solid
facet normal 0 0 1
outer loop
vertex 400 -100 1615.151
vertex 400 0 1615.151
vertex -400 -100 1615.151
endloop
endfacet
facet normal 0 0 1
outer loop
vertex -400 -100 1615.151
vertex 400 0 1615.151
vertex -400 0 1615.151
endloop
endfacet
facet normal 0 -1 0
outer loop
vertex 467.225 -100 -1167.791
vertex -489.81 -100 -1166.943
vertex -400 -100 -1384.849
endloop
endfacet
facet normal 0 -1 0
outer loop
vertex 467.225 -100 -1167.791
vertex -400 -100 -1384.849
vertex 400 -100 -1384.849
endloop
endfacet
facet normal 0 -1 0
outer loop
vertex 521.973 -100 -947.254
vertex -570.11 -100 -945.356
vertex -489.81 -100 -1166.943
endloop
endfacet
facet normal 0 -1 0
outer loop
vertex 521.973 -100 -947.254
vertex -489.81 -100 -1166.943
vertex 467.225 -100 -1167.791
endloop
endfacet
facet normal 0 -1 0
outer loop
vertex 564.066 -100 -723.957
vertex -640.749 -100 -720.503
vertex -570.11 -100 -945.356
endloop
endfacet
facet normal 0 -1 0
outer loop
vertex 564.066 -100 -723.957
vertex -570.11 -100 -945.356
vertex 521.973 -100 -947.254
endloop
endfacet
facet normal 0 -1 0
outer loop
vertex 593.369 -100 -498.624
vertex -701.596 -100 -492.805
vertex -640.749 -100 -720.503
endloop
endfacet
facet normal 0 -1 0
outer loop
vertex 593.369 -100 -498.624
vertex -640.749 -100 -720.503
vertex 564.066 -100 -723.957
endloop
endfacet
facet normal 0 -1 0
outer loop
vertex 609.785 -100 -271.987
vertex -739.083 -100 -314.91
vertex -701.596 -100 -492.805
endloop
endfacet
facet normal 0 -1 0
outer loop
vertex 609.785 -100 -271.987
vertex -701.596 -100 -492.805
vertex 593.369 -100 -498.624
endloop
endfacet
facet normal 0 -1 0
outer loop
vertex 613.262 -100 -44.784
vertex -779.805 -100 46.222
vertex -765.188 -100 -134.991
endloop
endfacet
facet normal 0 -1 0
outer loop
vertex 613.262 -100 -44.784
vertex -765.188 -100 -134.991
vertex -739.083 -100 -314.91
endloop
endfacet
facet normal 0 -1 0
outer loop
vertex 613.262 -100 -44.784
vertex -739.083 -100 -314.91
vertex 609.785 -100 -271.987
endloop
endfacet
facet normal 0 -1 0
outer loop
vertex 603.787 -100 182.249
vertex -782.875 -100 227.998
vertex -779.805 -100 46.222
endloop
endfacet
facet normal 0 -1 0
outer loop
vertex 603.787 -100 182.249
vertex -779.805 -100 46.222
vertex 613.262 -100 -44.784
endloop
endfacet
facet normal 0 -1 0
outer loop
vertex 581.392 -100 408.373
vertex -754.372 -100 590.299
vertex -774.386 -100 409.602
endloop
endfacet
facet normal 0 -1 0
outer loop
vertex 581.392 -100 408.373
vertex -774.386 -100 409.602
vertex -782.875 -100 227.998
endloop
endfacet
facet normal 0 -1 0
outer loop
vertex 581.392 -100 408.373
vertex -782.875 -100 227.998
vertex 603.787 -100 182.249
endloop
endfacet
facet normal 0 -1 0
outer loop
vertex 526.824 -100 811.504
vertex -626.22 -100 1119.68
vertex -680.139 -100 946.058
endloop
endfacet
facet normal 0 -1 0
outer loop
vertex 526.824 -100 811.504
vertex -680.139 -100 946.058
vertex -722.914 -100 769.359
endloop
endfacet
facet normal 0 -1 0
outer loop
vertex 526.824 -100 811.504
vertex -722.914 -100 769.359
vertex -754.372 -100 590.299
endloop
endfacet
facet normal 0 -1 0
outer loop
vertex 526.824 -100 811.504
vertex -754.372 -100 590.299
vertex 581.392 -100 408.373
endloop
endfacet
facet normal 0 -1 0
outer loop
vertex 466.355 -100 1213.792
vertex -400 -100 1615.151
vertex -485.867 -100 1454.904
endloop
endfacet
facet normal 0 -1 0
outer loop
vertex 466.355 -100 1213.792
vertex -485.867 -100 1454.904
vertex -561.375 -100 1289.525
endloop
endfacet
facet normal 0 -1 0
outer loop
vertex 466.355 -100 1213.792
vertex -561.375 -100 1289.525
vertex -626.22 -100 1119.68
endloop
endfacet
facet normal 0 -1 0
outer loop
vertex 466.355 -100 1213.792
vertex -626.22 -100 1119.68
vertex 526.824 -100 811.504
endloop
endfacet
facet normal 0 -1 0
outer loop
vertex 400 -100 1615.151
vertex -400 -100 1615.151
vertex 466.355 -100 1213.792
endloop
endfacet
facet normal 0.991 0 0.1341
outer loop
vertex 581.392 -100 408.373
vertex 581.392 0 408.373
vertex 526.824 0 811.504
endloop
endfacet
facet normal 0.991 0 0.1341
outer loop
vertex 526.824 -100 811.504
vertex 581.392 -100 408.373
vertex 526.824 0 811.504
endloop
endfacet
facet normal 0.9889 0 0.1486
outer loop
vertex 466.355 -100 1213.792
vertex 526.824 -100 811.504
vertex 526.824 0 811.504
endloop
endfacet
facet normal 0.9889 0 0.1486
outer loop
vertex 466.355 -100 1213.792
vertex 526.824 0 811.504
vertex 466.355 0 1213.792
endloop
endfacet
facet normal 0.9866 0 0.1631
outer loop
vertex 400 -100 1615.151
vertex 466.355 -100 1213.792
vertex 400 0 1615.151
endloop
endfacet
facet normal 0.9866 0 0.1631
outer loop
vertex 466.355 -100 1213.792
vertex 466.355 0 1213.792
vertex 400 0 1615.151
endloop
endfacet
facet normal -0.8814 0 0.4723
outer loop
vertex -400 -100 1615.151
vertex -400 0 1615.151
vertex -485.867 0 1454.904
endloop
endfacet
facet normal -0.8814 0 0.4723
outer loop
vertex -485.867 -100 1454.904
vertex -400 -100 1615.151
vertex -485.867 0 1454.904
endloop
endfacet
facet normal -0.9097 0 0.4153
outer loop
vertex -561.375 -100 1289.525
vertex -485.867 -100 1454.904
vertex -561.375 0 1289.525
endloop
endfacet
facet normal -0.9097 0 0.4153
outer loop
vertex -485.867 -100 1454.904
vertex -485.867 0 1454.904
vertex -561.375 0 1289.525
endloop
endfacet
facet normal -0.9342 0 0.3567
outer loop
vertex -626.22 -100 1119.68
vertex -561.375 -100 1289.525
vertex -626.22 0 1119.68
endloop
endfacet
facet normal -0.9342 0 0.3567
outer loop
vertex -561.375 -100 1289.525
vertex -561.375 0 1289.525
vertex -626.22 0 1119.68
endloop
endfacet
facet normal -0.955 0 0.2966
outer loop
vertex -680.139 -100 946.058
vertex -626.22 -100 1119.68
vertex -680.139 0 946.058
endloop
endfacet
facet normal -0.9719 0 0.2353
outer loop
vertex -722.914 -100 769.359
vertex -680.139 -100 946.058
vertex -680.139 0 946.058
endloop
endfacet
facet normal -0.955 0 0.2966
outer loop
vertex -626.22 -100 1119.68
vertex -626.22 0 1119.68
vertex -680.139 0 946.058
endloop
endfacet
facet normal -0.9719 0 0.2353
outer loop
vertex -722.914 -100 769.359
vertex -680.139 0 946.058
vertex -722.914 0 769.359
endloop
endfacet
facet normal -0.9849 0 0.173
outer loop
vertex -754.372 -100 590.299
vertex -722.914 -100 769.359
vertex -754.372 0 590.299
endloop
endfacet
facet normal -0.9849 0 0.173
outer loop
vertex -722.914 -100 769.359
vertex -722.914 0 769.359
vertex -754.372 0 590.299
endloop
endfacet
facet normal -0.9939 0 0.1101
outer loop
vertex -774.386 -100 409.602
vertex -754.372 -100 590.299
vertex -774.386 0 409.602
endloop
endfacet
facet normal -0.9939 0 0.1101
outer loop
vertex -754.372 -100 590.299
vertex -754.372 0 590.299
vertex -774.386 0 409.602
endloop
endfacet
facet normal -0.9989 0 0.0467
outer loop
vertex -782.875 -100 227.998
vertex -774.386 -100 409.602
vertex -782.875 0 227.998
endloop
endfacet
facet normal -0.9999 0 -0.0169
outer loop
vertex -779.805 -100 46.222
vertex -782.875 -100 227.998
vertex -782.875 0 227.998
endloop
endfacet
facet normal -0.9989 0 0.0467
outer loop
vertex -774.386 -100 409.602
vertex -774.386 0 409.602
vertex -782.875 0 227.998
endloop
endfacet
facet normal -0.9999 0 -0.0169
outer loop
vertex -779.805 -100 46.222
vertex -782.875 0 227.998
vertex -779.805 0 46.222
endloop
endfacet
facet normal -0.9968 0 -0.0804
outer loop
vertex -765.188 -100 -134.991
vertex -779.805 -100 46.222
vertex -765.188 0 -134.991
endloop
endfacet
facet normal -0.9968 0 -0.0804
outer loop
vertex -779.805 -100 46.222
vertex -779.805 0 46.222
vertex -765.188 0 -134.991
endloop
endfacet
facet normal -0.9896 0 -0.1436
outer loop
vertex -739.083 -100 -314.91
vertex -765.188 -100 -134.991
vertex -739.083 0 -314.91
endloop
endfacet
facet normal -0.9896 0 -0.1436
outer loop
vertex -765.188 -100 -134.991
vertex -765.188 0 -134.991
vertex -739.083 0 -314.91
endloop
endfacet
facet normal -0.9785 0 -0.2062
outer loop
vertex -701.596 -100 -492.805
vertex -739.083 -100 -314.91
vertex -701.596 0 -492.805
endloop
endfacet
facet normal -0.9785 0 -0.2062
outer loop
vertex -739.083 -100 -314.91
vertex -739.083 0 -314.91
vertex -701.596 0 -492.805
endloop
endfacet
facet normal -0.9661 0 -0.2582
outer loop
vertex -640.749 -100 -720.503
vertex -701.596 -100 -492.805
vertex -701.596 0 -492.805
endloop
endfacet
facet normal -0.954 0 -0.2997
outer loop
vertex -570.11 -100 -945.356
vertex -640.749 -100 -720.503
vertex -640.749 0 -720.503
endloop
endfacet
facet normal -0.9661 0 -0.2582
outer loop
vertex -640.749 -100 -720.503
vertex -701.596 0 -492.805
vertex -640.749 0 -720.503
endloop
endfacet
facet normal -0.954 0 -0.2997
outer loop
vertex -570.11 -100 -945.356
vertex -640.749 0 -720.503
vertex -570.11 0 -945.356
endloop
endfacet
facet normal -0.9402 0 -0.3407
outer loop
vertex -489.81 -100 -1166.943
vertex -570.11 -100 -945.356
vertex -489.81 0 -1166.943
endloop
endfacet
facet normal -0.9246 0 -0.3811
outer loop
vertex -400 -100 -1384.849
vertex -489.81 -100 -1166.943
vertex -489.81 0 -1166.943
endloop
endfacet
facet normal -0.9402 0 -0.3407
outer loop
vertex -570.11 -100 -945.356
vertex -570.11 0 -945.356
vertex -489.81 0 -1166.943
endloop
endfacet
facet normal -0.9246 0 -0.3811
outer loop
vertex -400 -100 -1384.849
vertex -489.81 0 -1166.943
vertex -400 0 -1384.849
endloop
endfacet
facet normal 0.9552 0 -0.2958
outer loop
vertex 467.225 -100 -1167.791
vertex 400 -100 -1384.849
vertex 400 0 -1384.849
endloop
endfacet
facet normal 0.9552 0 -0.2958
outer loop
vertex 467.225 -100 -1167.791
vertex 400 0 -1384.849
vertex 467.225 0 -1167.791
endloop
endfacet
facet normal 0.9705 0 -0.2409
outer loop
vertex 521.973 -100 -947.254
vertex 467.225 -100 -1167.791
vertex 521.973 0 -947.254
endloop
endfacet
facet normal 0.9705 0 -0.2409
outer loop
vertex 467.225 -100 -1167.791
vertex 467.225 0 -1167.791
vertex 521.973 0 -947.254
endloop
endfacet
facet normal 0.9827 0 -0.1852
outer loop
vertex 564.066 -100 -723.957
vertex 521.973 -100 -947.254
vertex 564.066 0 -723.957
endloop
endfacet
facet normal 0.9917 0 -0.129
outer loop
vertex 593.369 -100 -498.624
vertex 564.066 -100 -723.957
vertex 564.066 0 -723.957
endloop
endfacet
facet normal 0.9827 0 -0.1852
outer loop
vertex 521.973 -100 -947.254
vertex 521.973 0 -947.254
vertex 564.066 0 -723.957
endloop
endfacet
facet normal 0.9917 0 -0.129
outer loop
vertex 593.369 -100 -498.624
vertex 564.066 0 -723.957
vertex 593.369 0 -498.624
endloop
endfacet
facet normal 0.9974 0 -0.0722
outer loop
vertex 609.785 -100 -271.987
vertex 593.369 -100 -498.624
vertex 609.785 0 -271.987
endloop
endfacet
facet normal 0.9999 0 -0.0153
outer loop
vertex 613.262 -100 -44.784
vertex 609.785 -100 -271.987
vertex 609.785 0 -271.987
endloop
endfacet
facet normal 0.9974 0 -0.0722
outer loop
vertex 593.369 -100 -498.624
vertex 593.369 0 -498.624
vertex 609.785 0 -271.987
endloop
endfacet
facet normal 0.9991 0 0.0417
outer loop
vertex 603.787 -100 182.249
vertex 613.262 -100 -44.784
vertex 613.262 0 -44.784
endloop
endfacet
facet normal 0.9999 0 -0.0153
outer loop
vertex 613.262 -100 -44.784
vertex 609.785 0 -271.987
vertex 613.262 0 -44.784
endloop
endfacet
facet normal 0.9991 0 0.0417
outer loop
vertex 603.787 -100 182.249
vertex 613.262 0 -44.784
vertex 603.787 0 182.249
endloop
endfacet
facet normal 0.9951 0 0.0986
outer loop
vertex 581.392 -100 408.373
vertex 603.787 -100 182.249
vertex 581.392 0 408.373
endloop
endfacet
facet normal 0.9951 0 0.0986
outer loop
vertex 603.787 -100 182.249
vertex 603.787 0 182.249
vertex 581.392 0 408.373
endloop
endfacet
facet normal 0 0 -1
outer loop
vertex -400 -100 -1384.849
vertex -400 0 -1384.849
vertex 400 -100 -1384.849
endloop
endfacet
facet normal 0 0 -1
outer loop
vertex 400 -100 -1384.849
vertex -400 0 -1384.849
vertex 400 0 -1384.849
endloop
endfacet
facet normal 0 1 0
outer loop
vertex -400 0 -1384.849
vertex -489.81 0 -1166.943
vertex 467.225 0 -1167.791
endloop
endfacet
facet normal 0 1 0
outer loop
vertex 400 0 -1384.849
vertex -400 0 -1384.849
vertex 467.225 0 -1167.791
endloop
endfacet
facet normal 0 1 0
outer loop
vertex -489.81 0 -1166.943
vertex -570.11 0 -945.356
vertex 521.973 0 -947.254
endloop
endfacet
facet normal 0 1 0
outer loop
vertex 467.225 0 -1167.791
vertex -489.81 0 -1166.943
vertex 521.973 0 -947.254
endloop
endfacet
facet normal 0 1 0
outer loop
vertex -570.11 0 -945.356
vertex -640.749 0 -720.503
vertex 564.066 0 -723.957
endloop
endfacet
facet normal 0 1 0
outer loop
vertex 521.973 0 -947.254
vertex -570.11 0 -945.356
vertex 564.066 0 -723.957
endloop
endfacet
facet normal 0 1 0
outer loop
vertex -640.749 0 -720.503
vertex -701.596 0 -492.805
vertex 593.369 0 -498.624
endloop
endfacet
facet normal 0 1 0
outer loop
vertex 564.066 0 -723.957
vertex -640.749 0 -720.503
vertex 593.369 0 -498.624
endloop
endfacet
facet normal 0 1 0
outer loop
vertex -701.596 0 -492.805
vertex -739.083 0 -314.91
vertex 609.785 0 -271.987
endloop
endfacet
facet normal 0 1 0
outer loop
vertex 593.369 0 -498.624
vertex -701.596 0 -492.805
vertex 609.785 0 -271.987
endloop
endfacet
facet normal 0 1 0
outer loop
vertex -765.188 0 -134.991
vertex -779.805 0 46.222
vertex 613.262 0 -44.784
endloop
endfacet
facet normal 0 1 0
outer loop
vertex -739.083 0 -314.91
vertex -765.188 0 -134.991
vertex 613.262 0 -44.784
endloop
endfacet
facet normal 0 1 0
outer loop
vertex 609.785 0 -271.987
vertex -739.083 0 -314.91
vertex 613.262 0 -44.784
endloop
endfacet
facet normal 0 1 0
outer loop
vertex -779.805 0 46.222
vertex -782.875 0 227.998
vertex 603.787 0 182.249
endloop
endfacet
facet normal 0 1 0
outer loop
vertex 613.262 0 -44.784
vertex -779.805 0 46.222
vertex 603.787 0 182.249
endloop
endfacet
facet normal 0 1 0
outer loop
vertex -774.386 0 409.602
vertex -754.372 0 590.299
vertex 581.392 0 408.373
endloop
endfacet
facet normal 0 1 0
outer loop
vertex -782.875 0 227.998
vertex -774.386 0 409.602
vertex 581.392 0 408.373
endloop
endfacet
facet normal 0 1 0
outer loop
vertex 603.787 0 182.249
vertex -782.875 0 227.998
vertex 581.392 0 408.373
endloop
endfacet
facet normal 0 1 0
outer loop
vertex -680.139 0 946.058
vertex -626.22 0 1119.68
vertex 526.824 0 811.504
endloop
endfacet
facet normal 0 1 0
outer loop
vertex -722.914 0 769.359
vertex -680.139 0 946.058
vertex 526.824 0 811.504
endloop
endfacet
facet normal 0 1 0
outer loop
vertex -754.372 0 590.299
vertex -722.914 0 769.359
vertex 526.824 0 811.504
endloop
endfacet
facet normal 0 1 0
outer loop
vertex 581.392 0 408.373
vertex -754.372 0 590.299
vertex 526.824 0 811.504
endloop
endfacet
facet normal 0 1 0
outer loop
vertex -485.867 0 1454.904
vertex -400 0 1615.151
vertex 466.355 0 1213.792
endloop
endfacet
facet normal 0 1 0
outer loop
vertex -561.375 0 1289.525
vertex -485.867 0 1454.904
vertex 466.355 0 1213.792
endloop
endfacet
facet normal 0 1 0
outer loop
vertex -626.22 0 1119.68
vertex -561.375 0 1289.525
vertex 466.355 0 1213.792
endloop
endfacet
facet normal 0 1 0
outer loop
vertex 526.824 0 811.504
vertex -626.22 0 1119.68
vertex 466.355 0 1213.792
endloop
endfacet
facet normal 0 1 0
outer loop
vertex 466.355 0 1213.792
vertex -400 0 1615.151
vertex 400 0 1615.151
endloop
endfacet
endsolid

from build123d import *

# Parameters (mm, degrees)
F2_DEPTH = 100


with BuildPart() as f2:
    # F1 (on Front) → F2 (new body)
    with BuildSketch(Plane.XZ):
        with BuildLine():
            ThreePointArc((-701.5959593986, -492.8048068177), (-570.1100061445, -945.3563029663), (-400, -1384.849190712))
            Line((-400, -1384.849190712), (400, -1384.849190712))
            ThreePointArc((400, -1384.849190712), (593.3689666076, -498.6238592129), (581.3922700849, 408.3730835481))
            ThreePointArc((581.3922700849, 408.3730835481), (497.3260903136, 1012.7585032914), (400, 1615.150809288))
            Line((400, 1615.150809288), (-400, 1615.150809288))
            ThreePointArc((-400, 1615.150809288), (-754.3722985404, 590.2994171477), (-701.5959593986, -492.8048068177))
        make_face()
    extrude(amount=F2_DEPTH)


solid = f2.part
